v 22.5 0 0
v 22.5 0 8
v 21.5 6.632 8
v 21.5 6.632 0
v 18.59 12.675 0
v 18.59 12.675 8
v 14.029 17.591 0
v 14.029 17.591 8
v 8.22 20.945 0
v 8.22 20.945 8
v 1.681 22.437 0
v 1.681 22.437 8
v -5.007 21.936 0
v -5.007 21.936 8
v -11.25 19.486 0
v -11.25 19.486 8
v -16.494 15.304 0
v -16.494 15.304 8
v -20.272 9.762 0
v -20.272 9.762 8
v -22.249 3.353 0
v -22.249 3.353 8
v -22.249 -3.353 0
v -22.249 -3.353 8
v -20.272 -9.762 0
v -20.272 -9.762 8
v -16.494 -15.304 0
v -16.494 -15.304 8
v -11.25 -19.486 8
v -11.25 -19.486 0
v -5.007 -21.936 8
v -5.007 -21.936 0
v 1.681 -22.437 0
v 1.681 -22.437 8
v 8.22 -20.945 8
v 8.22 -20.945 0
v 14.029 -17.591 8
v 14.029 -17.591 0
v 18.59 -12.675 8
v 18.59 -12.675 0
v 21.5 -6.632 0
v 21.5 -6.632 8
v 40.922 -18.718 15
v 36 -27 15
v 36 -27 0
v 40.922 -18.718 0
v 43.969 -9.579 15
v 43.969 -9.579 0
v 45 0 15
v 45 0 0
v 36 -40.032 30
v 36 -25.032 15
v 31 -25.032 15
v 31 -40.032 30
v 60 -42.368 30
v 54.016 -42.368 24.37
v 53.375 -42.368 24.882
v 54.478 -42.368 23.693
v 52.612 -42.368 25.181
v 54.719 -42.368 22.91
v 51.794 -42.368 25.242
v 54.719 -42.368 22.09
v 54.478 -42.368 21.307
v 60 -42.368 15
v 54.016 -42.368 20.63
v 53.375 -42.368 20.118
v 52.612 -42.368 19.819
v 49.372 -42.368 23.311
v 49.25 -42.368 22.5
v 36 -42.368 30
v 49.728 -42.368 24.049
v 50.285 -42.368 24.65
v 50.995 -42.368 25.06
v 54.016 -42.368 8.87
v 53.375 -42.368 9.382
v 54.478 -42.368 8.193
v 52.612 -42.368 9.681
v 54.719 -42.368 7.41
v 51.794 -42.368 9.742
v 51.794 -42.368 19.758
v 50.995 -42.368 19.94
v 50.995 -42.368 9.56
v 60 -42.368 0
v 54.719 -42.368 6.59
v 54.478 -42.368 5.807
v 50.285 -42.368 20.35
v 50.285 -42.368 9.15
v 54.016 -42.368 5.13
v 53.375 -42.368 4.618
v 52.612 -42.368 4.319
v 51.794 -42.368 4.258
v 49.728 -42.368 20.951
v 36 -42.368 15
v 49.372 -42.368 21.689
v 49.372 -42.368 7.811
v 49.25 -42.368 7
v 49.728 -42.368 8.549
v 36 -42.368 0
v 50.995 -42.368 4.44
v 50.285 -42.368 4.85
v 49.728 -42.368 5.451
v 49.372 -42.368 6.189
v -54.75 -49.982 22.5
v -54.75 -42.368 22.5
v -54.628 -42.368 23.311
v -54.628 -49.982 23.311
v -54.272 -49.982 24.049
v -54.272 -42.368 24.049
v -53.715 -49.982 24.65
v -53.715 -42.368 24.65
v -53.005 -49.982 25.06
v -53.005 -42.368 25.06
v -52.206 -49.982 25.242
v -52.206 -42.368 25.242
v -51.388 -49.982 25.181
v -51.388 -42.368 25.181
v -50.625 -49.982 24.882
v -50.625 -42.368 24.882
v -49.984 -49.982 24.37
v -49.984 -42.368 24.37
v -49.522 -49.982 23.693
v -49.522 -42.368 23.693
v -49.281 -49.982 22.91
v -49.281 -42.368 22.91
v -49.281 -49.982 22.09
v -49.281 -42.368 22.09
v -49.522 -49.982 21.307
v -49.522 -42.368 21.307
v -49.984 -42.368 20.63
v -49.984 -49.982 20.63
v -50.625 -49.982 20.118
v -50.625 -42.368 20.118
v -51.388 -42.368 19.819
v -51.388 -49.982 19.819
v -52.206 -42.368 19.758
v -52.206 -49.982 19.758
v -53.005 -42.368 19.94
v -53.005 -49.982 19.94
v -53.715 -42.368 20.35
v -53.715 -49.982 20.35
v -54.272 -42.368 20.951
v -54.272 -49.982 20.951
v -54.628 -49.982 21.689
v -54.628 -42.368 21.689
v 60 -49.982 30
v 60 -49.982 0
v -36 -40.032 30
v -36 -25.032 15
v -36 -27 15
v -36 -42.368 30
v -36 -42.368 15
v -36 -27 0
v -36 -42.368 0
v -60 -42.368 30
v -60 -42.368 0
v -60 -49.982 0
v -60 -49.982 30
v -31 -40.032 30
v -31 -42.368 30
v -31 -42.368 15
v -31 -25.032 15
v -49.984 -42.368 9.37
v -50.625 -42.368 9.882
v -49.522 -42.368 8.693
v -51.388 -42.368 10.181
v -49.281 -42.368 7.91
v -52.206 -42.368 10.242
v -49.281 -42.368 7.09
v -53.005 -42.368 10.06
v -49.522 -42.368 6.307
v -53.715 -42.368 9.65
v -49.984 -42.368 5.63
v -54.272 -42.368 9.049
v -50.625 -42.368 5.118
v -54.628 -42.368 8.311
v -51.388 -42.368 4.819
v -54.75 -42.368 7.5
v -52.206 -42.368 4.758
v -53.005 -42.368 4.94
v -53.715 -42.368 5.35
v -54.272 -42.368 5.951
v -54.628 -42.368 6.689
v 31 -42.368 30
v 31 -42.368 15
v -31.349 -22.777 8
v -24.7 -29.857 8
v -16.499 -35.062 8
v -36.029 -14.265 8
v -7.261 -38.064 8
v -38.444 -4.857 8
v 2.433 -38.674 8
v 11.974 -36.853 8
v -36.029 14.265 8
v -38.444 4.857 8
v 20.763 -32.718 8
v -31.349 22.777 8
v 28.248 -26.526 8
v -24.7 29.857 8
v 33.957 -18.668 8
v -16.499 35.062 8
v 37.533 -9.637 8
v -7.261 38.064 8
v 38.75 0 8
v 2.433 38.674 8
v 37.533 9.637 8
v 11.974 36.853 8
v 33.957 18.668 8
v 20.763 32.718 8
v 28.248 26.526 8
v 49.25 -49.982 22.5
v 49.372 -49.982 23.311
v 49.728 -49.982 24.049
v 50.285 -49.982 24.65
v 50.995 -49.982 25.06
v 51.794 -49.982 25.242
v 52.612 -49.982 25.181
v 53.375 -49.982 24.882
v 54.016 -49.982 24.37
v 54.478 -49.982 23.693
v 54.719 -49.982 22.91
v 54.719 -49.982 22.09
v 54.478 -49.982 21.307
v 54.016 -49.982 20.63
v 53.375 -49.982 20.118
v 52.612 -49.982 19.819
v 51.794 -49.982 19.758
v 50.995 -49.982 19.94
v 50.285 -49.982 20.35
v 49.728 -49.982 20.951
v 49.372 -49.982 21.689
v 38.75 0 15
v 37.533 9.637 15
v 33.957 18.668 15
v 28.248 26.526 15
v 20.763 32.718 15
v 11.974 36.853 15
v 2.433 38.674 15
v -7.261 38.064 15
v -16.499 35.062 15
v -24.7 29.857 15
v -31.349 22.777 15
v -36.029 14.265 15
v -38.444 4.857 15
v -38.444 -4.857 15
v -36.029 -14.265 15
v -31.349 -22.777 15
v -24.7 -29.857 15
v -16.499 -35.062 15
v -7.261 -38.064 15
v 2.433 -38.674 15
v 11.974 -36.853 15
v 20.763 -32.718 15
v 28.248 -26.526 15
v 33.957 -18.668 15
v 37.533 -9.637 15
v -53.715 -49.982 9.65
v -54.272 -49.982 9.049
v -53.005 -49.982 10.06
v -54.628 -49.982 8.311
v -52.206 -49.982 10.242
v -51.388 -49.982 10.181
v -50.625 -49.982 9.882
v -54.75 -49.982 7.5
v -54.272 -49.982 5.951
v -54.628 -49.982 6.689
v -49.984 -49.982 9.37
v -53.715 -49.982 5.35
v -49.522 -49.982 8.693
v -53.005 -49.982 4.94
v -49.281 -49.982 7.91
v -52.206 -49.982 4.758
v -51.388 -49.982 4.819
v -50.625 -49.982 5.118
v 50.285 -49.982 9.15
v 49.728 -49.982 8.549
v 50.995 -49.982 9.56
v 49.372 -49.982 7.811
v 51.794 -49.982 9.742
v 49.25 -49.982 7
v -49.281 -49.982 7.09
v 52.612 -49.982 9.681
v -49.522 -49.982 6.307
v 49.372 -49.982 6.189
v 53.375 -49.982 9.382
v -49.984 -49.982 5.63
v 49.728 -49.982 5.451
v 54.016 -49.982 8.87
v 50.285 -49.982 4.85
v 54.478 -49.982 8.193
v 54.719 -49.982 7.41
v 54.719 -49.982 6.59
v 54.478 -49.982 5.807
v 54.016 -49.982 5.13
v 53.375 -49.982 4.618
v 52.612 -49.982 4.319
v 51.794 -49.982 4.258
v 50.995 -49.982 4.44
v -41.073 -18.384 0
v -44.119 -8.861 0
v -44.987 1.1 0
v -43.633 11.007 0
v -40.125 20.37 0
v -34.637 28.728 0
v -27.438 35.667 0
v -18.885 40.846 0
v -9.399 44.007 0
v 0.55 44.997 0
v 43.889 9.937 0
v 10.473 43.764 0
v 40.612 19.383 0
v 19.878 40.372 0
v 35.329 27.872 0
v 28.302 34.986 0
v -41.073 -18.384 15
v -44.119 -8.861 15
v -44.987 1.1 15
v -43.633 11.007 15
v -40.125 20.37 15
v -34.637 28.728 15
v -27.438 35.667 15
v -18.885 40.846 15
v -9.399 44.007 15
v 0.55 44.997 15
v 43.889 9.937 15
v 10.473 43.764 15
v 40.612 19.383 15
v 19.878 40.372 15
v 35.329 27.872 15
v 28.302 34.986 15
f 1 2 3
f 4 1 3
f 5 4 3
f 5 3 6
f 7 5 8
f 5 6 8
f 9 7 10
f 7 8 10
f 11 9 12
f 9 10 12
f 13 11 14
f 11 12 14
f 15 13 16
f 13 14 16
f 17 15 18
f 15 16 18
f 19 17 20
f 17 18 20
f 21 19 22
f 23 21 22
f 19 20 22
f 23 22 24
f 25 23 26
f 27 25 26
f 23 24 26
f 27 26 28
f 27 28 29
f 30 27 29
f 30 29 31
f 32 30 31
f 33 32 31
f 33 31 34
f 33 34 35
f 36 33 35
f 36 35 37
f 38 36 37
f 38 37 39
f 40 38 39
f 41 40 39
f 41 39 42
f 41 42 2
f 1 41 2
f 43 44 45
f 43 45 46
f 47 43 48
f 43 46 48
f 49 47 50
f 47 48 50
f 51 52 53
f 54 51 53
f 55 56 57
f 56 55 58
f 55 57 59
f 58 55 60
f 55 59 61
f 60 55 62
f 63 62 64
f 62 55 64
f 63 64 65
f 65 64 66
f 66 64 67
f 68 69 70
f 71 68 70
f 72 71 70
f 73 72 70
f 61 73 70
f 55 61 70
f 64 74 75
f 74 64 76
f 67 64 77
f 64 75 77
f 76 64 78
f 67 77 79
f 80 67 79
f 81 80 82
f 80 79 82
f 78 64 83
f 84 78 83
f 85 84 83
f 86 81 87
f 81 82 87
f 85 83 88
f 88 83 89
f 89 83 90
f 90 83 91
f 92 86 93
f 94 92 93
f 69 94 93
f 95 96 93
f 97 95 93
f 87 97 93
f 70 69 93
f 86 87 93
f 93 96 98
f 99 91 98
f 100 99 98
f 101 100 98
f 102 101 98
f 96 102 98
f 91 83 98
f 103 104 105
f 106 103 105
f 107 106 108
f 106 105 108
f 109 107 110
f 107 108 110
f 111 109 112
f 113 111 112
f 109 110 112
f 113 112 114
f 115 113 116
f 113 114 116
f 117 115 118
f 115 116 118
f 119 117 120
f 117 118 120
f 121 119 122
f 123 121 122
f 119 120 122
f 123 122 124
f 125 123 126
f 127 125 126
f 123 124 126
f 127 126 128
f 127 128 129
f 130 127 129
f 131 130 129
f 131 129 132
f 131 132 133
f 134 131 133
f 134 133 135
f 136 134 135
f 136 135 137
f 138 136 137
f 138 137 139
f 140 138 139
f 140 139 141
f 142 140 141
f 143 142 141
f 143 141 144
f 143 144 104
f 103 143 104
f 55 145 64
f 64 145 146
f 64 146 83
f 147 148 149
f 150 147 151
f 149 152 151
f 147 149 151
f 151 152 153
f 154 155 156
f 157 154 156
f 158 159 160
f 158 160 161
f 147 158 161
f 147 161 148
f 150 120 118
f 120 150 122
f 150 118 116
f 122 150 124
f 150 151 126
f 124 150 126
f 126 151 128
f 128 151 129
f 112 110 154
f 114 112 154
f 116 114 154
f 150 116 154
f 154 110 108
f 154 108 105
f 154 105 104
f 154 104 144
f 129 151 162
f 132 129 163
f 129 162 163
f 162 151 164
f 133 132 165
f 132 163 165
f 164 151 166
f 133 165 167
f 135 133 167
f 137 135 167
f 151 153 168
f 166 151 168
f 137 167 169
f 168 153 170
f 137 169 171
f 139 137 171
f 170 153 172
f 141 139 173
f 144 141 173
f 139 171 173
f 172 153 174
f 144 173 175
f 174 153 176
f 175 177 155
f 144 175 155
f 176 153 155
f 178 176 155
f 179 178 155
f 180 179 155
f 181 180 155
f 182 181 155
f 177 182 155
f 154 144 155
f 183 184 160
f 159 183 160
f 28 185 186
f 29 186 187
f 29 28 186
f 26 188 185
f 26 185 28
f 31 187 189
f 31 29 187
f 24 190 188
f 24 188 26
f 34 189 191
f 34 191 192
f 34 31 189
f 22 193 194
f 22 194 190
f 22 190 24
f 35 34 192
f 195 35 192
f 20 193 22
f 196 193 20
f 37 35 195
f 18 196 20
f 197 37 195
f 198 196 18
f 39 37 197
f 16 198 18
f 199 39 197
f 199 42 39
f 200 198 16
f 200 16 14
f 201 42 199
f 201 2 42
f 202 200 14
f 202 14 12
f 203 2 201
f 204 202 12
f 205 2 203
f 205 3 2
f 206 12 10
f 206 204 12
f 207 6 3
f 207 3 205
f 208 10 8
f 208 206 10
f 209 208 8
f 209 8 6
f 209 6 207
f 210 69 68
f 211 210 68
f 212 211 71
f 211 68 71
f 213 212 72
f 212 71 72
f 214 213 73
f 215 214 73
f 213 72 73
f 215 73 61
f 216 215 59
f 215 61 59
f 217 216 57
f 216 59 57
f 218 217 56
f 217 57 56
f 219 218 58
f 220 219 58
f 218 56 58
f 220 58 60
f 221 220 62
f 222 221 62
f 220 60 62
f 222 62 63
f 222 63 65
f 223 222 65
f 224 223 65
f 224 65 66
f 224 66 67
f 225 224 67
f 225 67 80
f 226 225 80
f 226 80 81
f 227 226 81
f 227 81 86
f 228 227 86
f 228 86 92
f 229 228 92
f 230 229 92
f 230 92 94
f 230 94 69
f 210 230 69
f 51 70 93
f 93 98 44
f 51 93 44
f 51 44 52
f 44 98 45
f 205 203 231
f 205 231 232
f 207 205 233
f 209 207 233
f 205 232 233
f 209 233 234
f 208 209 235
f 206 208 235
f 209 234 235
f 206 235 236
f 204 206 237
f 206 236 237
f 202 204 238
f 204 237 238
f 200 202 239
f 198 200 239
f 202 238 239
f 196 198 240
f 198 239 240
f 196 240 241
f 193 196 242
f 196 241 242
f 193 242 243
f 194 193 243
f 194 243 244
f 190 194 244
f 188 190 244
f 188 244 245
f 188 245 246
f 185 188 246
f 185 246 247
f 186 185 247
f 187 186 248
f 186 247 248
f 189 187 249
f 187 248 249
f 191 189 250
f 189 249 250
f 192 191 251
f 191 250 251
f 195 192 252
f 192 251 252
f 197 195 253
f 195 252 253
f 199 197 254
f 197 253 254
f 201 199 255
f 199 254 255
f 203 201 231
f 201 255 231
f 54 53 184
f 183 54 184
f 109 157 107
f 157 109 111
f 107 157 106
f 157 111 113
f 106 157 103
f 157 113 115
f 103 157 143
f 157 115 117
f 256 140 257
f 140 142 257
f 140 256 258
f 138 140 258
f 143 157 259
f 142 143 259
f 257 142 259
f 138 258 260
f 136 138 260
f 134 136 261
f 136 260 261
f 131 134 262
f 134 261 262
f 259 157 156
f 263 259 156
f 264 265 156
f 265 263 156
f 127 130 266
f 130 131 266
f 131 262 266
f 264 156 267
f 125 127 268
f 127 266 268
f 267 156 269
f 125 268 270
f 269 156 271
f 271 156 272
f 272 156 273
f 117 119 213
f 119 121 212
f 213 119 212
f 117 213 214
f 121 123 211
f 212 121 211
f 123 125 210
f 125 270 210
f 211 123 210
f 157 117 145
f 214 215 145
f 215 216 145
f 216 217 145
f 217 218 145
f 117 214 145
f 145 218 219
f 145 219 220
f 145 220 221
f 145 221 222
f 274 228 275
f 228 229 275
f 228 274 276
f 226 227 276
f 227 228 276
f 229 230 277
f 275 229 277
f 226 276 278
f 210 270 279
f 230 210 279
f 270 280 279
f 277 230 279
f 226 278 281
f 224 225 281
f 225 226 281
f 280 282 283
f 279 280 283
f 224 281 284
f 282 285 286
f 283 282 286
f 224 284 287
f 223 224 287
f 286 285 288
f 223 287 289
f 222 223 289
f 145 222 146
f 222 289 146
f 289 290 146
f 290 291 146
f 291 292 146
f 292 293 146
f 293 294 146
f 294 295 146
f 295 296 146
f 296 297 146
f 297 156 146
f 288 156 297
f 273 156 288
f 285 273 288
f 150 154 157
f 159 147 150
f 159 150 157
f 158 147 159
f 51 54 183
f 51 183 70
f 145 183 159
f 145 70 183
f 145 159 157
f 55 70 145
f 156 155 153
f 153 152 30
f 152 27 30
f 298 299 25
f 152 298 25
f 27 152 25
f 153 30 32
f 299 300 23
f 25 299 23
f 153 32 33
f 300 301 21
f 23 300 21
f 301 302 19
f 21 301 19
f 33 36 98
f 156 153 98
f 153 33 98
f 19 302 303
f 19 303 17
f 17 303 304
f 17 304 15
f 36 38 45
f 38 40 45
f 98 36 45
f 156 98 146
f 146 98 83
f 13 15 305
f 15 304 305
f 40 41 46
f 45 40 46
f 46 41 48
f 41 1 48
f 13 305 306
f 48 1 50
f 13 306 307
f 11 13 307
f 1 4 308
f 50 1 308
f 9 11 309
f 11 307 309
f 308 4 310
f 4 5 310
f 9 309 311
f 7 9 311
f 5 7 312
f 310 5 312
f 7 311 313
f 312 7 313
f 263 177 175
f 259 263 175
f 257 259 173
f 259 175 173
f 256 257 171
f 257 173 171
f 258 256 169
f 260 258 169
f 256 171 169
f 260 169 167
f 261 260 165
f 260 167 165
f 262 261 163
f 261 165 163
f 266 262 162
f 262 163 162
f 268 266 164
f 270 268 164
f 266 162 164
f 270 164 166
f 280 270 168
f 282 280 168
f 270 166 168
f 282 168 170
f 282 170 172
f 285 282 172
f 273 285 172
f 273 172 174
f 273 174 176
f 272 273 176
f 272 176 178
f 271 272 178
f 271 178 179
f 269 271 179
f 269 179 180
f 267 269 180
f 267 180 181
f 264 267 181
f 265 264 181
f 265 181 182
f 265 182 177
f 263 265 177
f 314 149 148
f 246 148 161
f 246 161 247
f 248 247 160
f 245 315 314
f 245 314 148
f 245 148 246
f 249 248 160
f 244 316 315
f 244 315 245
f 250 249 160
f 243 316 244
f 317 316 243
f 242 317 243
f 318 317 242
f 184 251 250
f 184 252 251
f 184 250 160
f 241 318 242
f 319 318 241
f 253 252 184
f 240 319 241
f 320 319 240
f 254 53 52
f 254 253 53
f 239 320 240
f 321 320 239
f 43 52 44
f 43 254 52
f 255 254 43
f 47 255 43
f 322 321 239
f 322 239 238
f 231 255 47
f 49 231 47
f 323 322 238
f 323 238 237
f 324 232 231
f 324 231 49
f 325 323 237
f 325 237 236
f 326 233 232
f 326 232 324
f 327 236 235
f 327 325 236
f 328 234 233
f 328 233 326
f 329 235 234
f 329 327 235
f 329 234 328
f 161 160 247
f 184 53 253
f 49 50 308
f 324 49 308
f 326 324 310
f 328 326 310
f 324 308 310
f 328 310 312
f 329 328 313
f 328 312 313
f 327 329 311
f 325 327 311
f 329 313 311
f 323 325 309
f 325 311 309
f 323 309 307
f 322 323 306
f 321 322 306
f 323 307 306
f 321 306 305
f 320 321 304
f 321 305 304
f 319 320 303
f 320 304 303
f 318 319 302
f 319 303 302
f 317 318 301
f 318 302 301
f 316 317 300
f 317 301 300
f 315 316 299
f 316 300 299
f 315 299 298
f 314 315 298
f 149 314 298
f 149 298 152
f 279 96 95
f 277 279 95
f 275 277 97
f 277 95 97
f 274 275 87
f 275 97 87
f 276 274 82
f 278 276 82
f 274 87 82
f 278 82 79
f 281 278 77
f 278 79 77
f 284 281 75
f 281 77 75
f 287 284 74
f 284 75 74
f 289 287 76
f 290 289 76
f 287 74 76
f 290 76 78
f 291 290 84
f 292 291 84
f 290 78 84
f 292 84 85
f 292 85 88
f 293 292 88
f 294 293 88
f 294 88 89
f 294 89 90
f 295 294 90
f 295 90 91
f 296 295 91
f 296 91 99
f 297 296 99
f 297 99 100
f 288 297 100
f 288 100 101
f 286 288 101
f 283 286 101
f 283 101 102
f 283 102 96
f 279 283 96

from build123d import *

# Parameters (mm, degrees)
F0_W      = 24
F0_H      = 7.6146386564
F1_DEPTH  = 15
F2_R      = 38.75
F4_DEPTH  = 7
F5_DEPTH  = 15
F7_DEPTH  = 15
F8_SIZE   = 14.99999
F9_R      = 2.75
F10_DEPTH = 25
F11_R     = 22.5
F12_DEPTH = 25


# Not quite as in the source:
# - a fillet or chamfer is up to 0.001 mm smaller than in the source, because OpenCascade refuses the exact size


with BuildPart() as f1:
    # F0 (on Top) → F1 (new body)
    with BuildSketch(Plane.XY):
        with BuildLine():
            ThreePointArc((36, -27), (42.6907484123, -14.2302494708), (45, 0))
            ThreePointArc((45, 0), (-14.2302494708, 42.6907484123), (-36, -27))
            Line((-36, -27), (36, -27))
        make_face()
        with BuildLine():
            ThreePointArc((-15.1652218257, -42.3676297069), (-26.7116265289, -36.2144861648), (-36, -27))
            Line((-36, -27), (-36, -42.3676297069))
            Line((-36, -42.3676297069), (-15.1652218257, -42.3676297069))
        make_face()
        with BuildLine():
            Line((36, -27), (-36, -27))
            ThreePointArc((-36, -27), (-26.7116265289, -36.2144861648), (-15.1652218257, -42.3676297069))
            Line((-15.1652218257, -42.3676297069), (15.1652218257, -42.3676297069))
            ThreePointArc((15.1652218257, -42.3676297069), (26.7116265289, -36.2144861648), (36, -27))
        make_face()
        with BuildLine():
            Line((15.1652218257, -42.3676297069), (-15.1652218257, -42.3676297069))
            ThreePointArc((-15.1652218257, -42.3676297069), (0, -45), (15.1652218257, -42.3676297069))
        make_face()
        with Locations((-48, -46.174949035)):
            Rectangle(F0_W, F0_H)
        with BuildLine():
            ThreePointArc((15.1652218257, -42.3676297069), (0, -45), (-15.1652218257, -42.3676297069))
            Line((-15.1652218257, -42.3676297069), (-36, -42.3676297069))
            Line((-36, -42.3676297069), (-36, -49.9822683632))
            Line((-36, -49.9822683632), (36, -49.9822683632))
            Line((36, -49.9822683632), (36, -42.3676297069))
            Line((36, -42.3676297069), (15.1652218257, -42.3676297069))
        make_face()
        with Locations((48, -46.174949035)):
            Rectangle(F0_W, F0_H)
        with BuildLine():
            Line((36, -42.3676297069), (36, -27))
            ThreePointArc((36, -27), (26.7116265289, -36.2144861648), (15.1652218257, -42.3676297069))
            Line((15.1652218257, -42.3676297069), (36, -42.3676297069))
        make_face()
    extrude(amount=F1_DEPTH)

    # F2 (on face) → F4 (cut)
    with BuildSketch(Plane.XY.offset(15)):
        Circle(F2_R)
    extrude(amount=-F4_DEPTH, mode=Mode.SUBTRACT)

    # F3 (on face) → F5 (join)
    with BuildSketch(Plane.XY.offset(15)):
        Polygon((-36, -42.3676297069), (-60, -42.3676297069), (-60, -49.9822683632), (60, -49.9822683632), (60, -42.3676297069), (36, -42.3676297069), align=None)
    extrude(amount=F5_DEPTH)

    # F6 (on face) → F7 (join)
    with BuildSketch(Plane.XY.offset(15)):
        Polygon((-31, -25.031657964), (-36, -25.031657964), (-36, -27), (-36, -42.3676297069), (-31, -42.3676297069), align=None)
        Polygon((36, -42.3676297069), (36, -27), (36, -25.031657964), (31, -25.031657964), (31, -42.3676297069), align=None)
    extrude(amount=F7_DEPTH)

    # F8 (size 15 in the source; OpenCascade refuses exactly that, so slightly less here)
    f8_edges = [f1.edges().sort_by_distance(p)[0] for p in [
        (-33.5, -25.031658, 30),
        (33.5, -25.031658, 30),
    ]]
    chamfer(f8_edges, length=F8_SIZE)

    # F9 (on face) → F10 (cut)
    with BuildSketch(Plane(origin=(0, -42.3676297069, 0), x_dir=(-1, 0, 0), z_dir=(0, 1, 0))):
        with Locations((52, 7.5)):
            Circle(F9_R)
        with Locations((52, 22.5)):
            Circle(F9_R)
        with Locations((-52, 7)):
            Circle(F9_R)
        with Locations((-52, 22.5)):
            Circle(F9_R)
    extrude(amount=-F10_DEPTH, mode=Mode.SUBTRACT)

    # F11 (on face) → F12 (cut)
    with BuildSketch(Plane.XY.offset(8)):
        Circle(F11_R)
    extrude(amount=-F12_DEPTH, mode=Mode.SUBTRACT)


solid = f1.part
